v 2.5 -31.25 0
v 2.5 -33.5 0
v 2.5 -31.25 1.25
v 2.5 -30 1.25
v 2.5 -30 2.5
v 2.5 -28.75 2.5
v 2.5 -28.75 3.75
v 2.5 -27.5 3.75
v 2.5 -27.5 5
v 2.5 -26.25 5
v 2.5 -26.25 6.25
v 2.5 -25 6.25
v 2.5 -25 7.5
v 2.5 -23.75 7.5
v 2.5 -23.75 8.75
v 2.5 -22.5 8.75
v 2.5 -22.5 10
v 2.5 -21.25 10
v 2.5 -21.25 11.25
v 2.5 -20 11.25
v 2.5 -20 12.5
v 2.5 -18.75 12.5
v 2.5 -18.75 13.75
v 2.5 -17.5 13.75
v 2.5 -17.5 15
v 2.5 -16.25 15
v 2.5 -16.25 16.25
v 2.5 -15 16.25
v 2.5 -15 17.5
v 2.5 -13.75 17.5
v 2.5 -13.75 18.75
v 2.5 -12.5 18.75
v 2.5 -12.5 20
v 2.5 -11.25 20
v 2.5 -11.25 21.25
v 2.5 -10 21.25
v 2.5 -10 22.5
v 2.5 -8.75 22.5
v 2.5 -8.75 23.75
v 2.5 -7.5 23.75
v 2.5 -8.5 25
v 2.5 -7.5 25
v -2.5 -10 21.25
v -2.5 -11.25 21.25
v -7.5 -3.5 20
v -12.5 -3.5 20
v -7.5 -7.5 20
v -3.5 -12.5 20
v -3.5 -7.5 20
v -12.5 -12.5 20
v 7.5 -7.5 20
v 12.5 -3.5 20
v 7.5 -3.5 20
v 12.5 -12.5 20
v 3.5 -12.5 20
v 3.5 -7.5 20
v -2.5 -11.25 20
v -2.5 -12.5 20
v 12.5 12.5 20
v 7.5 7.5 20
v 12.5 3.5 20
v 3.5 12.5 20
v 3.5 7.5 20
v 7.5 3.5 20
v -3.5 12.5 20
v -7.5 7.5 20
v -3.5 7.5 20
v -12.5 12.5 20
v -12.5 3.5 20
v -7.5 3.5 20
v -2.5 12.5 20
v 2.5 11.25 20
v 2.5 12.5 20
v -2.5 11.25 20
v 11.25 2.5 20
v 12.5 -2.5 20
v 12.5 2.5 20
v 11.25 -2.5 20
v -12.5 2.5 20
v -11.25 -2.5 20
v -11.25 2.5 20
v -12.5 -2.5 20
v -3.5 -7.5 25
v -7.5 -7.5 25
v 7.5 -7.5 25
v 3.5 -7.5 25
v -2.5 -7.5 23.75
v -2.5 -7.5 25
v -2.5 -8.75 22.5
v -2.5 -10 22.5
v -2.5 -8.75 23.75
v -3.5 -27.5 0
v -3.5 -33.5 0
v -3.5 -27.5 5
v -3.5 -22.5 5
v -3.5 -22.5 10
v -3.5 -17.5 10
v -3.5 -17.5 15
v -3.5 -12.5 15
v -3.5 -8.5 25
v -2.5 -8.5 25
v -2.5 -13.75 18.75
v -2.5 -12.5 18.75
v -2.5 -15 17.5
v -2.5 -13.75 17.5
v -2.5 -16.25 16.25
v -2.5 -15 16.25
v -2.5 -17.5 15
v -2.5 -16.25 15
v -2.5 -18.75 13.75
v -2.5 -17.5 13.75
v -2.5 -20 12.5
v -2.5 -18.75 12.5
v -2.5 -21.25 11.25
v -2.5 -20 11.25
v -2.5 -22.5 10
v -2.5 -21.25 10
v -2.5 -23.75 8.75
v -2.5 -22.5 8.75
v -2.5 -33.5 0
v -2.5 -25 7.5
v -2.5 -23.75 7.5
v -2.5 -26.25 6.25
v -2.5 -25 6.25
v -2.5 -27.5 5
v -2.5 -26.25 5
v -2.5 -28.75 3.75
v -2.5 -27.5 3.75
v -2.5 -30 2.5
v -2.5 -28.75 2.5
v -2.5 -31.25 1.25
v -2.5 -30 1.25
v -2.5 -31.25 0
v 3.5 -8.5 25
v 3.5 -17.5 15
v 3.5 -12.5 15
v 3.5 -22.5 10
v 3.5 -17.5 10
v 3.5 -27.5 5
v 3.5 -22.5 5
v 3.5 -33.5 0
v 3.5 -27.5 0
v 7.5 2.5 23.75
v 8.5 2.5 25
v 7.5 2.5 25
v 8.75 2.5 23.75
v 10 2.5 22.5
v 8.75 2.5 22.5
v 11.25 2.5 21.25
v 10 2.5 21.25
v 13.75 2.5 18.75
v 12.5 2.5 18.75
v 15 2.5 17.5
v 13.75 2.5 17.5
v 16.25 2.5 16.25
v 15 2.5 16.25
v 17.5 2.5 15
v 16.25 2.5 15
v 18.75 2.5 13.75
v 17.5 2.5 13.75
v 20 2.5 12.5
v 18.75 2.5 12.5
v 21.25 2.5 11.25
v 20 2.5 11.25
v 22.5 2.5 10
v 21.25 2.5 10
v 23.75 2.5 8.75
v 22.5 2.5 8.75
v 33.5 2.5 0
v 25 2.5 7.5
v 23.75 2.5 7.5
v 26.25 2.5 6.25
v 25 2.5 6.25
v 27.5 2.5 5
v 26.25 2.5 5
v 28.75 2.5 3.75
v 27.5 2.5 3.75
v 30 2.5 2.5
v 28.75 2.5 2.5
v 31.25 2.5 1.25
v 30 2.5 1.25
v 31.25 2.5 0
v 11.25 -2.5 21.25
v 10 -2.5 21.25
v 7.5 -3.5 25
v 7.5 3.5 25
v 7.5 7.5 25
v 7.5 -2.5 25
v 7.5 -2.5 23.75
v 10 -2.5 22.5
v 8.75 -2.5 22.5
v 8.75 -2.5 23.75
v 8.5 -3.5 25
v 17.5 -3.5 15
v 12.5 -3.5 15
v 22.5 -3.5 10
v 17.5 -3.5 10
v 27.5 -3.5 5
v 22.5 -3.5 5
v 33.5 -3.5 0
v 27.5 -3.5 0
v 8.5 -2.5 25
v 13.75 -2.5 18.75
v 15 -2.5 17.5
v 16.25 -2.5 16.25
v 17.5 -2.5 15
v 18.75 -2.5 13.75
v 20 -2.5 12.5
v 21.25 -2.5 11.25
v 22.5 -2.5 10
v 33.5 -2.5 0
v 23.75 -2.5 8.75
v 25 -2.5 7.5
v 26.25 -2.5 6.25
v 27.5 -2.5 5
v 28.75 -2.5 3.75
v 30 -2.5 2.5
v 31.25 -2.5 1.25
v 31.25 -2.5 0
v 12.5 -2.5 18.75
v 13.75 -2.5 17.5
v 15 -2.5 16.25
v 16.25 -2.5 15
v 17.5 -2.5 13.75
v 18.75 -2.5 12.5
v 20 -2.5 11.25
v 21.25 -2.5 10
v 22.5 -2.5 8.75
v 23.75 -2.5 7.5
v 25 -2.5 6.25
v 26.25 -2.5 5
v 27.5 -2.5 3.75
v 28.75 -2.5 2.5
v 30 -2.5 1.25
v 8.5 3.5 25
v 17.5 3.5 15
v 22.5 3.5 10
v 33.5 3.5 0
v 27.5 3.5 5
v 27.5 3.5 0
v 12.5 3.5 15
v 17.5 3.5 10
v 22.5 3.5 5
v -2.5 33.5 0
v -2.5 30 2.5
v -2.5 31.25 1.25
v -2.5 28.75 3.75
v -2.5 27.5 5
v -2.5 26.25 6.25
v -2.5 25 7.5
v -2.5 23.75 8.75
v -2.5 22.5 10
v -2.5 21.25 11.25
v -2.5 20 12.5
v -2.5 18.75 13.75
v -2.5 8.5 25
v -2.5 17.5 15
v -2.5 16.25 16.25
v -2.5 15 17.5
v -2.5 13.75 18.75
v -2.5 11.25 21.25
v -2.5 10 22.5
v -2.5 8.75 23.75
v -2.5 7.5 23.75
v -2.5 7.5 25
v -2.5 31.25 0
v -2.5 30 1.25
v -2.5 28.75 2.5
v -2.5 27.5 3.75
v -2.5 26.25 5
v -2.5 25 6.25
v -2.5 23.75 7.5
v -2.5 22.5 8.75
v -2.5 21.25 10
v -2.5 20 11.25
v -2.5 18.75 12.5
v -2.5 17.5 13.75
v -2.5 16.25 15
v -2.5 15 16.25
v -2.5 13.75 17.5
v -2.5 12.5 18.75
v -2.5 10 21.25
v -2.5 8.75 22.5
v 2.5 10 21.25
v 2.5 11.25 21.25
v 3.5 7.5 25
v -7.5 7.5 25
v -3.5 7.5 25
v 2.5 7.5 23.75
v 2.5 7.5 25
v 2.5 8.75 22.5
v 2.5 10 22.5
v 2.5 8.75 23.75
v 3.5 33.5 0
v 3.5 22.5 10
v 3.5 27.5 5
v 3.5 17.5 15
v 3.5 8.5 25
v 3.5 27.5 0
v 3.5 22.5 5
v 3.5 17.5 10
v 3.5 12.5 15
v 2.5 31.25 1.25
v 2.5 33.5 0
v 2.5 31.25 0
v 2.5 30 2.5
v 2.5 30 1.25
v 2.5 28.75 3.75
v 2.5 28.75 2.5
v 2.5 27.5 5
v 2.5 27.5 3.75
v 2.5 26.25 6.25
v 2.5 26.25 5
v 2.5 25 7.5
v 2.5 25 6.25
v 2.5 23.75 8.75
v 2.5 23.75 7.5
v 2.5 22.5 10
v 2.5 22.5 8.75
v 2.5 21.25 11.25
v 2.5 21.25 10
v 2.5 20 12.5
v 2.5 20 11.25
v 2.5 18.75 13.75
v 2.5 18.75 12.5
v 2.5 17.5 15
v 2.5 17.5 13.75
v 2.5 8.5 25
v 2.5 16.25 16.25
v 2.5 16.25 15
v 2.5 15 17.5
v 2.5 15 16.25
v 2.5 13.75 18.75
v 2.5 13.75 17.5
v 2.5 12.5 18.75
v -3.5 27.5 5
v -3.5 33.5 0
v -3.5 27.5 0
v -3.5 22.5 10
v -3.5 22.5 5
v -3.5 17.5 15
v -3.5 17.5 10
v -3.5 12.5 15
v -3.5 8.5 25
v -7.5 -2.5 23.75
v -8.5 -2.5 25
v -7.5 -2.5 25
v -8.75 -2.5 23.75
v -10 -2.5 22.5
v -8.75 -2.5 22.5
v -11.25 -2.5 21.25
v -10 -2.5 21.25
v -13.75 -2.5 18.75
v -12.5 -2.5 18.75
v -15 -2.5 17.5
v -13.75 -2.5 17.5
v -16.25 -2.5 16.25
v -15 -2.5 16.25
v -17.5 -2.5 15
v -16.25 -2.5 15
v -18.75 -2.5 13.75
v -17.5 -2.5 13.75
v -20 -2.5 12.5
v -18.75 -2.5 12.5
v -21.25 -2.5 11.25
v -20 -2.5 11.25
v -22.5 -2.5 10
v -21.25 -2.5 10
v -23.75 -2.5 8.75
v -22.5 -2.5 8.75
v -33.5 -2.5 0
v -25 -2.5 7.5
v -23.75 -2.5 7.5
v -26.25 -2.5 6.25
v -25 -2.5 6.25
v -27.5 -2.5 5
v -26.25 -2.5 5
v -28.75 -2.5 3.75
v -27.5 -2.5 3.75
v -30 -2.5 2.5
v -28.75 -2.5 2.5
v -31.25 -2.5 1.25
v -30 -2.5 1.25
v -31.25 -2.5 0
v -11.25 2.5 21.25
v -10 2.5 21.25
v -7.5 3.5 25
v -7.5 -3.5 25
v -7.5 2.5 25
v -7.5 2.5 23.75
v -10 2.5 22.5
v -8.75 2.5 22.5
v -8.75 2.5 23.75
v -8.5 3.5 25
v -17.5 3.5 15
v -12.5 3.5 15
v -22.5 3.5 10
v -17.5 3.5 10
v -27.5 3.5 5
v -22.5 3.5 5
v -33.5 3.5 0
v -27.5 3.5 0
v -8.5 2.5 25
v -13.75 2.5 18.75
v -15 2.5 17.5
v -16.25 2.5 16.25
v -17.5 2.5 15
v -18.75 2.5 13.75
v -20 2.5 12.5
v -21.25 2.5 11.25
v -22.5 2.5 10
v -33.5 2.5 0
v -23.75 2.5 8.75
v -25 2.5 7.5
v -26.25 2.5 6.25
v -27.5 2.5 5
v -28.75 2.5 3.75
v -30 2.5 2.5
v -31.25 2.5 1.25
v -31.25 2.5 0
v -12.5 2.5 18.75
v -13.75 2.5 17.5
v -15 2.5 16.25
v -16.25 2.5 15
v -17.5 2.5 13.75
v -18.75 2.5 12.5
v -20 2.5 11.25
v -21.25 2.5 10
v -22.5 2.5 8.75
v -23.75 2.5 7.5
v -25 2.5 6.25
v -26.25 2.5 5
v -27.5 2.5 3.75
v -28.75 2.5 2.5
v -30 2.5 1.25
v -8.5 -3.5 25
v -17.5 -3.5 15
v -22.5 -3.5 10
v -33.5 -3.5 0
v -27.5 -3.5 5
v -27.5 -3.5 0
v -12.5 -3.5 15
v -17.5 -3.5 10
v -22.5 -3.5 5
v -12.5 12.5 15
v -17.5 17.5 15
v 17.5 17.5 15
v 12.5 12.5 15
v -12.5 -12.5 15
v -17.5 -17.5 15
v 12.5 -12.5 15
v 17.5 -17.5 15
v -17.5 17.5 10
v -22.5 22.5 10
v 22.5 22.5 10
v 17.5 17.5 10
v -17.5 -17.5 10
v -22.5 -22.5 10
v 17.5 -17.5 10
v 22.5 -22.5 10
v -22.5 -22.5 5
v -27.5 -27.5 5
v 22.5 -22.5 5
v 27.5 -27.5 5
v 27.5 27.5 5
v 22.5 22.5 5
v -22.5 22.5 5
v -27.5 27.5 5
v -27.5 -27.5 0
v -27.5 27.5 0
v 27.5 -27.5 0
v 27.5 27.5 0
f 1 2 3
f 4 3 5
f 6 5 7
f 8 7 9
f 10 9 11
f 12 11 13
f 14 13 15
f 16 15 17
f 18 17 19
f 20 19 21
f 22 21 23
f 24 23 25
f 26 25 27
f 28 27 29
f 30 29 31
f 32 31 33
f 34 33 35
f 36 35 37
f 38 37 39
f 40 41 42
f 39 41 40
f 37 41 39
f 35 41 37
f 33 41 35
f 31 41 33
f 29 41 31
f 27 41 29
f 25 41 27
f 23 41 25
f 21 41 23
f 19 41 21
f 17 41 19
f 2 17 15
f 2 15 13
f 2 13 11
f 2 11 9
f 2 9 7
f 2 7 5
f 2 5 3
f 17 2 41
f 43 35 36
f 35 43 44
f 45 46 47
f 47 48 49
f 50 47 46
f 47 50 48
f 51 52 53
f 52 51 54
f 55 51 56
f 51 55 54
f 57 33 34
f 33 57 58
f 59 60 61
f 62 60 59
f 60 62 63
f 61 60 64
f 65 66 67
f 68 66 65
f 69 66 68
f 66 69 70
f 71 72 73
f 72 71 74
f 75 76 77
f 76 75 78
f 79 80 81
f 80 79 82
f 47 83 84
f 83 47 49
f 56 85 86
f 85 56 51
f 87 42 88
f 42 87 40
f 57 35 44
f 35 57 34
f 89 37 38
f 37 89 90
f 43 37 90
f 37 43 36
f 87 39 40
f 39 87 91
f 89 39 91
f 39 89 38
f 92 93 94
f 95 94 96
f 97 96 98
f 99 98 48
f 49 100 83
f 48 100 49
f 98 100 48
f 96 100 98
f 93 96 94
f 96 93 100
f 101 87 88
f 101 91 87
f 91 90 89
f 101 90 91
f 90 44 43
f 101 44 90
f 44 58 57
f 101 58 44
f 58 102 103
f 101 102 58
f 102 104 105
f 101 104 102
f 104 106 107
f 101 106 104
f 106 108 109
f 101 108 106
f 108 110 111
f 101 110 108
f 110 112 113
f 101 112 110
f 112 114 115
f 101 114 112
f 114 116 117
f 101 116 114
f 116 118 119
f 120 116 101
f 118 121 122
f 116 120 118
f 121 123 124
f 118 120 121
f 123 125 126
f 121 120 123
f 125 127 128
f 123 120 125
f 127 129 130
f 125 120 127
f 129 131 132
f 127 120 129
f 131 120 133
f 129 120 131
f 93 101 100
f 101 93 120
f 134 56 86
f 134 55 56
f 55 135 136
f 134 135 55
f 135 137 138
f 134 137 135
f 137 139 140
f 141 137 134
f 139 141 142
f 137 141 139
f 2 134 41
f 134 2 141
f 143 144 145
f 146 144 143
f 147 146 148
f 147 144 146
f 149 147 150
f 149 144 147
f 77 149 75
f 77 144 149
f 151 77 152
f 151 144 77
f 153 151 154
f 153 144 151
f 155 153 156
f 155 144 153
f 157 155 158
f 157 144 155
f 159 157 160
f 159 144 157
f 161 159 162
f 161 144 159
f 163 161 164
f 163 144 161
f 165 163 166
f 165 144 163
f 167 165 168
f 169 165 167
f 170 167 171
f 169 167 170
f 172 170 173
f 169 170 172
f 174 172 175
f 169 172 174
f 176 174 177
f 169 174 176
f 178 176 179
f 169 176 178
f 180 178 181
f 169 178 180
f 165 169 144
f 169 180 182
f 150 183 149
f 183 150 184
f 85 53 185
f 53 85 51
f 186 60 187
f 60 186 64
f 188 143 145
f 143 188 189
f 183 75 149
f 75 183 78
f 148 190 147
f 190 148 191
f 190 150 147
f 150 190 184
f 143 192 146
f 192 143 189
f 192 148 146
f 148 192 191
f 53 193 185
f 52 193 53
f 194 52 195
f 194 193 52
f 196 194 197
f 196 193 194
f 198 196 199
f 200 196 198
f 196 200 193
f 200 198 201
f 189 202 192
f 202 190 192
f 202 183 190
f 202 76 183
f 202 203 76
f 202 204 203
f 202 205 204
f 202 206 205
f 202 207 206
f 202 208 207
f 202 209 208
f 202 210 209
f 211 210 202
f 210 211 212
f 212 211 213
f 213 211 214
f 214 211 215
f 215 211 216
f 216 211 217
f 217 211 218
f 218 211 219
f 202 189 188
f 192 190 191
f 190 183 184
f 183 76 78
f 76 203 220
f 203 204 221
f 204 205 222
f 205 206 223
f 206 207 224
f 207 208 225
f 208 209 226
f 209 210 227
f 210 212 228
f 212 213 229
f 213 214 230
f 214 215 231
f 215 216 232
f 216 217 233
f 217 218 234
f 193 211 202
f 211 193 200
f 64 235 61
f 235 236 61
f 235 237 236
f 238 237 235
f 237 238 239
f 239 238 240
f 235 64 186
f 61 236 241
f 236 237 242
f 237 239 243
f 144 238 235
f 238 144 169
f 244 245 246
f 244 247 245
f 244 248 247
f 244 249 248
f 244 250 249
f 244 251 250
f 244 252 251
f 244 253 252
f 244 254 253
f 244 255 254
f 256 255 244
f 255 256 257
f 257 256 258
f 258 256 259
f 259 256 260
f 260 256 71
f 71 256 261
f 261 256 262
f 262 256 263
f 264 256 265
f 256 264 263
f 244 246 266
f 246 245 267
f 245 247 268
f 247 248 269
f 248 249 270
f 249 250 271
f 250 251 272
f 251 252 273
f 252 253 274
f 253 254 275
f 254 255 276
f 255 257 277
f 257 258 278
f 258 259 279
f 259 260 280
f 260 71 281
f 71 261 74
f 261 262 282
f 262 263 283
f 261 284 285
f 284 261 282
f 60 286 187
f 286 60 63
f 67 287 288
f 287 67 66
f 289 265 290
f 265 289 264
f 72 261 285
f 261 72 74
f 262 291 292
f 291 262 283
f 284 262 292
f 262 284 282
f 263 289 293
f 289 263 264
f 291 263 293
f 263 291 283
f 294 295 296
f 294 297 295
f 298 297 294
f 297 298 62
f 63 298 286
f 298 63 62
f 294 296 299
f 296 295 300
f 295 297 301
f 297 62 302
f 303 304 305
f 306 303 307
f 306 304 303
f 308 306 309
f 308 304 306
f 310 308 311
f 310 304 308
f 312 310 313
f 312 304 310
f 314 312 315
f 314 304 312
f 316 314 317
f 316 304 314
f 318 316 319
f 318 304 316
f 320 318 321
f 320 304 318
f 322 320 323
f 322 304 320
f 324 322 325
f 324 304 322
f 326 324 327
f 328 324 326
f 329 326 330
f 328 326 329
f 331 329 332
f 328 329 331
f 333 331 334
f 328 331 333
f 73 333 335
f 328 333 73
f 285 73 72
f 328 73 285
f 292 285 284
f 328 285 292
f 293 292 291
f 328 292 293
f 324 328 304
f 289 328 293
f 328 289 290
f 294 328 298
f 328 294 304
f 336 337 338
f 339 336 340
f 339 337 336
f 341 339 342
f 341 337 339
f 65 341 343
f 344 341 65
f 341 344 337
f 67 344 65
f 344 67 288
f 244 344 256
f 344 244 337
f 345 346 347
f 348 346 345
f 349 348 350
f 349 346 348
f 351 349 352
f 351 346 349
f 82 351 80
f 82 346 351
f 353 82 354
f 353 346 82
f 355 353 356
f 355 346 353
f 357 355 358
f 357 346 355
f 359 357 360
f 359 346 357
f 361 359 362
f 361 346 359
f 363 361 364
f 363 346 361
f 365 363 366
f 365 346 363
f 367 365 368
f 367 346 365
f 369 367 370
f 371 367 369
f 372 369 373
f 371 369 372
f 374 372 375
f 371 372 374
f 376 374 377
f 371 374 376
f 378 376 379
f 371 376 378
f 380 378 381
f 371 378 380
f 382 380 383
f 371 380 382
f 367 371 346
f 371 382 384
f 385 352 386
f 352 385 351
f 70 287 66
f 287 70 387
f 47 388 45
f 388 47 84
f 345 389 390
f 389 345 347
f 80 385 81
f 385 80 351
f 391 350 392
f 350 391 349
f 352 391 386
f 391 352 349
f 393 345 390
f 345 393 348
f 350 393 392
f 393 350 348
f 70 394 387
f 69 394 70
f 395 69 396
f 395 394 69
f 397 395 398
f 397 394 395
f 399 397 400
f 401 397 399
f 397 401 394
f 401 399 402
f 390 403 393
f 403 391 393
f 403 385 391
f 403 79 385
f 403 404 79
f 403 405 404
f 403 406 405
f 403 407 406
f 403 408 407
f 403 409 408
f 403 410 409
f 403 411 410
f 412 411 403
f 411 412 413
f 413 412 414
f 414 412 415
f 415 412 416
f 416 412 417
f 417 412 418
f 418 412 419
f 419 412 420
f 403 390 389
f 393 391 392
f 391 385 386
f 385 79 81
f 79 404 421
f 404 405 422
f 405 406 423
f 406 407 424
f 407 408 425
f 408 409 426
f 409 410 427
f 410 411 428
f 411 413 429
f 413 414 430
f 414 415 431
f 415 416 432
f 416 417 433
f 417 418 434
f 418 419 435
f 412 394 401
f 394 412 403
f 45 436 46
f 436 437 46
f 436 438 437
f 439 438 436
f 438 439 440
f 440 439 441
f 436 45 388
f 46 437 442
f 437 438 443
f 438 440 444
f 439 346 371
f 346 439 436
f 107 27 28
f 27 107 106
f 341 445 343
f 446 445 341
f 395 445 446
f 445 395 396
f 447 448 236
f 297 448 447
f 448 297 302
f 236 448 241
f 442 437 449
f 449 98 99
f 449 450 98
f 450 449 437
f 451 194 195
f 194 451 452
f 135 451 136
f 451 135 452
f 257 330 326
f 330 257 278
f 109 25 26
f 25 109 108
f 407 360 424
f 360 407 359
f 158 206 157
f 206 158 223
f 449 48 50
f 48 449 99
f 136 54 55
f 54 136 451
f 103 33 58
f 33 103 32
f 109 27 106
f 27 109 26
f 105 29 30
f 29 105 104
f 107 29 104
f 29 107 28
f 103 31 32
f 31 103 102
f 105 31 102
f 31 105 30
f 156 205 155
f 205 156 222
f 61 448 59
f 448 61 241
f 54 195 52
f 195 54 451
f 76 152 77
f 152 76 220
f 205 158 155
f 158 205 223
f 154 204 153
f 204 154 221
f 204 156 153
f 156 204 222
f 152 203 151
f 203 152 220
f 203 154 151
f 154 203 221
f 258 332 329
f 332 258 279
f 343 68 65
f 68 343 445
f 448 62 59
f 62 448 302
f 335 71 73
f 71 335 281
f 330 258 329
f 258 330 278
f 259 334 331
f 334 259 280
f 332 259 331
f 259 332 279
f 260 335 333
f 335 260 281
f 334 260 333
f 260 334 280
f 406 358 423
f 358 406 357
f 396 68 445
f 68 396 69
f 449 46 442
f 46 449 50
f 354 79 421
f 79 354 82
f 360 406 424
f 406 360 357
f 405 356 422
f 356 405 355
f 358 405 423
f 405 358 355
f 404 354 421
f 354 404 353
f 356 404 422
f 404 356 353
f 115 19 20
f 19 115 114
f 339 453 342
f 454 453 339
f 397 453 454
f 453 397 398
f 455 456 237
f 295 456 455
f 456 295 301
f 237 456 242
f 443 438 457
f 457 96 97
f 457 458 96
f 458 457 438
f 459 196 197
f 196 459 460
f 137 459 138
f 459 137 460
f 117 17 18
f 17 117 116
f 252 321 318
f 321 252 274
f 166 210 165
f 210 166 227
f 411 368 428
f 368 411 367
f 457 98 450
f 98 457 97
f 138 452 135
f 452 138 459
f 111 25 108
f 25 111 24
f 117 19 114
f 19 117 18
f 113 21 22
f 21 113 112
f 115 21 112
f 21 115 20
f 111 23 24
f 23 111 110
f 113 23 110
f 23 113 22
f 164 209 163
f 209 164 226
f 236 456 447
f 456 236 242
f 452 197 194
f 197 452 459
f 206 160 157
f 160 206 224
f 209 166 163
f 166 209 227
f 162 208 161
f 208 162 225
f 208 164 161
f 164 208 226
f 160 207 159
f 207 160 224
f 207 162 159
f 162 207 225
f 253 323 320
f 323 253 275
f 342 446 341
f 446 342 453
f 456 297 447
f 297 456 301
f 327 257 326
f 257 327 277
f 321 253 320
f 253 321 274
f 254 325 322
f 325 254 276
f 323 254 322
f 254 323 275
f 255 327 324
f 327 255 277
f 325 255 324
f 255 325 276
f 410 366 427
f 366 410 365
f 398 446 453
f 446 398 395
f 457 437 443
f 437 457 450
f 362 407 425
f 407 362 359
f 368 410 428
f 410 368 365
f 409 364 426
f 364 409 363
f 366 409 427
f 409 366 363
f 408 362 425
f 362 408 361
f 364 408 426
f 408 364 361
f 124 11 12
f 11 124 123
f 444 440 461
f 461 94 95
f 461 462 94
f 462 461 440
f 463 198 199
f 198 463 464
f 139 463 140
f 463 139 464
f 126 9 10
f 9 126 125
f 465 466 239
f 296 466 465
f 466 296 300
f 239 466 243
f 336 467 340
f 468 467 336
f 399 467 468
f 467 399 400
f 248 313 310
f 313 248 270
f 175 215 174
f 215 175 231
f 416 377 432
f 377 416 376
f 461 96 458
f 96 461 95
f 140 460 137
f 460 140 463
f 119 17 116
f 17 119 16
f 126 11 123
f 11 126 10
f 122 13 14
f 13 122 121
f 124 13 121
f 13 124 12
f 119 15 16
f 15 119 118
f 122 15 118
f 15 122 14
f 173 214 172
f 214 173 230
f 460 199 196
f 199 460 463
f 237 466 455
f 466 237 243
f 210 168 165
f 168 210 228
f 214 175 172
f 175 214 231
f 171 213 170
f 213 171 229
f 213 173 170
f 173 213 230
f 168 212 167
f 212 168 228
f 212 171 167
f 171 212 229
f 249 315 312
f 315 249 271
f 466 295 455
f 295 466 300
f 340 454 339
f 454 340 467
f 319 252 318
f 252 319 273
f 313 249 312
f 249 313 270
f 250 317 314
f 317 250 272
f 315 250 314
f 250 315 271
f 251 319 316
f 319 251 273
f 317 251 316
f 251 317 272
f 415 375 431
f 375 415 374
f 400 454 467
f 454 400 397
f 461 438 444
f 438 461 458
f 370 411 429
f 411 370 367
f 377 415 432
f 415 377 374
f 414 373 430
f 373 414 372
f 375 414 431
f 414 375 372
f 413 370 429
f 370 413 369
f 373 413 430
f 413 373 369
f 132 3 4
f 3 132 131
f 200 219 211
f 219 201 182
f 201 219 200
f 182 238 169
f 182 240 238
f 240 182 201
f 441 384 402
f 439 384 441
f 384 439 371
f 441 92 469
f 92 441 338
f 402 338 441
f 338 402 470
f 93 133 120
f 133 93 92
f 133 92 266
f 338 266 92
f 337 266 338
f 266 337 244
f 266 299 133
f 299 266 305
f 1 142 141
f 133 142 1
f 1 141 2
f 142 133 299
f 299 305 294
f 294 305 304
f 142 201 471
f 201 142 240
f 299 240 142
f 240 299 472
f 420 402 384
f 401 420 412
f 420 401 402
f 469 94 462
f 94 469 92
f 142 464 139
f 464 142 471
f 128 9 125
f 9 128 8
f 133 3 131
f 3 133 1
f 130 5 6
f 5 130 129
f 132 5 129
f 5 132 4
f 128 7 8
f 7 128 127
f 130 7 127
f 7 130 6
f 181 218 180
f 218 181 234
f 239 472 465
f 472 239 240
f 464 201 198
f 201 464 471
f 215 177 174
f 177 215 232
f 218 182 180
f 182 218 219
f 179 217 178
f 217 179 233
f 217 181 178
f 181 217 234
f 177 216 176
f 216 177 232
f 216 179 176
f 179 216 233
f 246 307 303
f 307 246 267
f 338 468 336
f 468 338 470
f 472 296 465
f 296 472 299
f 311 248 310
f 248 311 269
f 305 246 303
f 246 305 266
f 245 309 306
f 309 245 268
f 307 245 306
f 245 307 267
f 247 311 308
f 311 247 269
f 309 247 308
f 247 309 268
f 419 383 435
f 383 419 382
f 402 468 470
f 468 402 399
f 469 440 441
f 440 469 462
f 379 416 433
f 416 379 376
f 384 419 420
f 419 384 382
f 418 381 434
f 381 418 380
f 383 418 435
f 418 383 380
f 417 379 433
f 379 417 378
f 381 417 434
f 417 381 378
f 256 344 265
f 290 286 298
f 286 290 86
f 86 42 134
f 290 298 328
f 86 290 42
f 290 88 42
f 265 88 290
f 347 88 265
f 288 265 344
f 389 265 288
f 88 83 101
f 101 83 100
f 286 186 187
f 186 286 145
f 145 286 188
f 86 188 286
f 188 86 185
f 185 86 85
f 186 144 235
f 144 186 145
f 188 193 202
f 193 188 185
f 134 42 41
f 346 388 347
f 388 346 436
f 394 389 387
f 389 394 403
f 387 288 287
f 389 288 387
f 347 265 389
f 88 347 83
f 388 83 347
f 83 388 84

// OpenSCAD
// ****************************************************
//              INCA Pyramid
// By:          Humberto Kelkboom 
// Date:        17 Oct 2014
//
//*****************************************************


//Set the scaling of the Object. Standard it base is 1x1x1
ScaleFactor = 5;

//Set the number of levels of the Pyramid
Nivo = 5 ;


scale([ScaleFactor,ScaleFactor,ScaleFactor])
difference()
{
union() 
{
    for ( i = [1 : Nivo] )
    {
        translate([(i*-1)-0.5,(i*-1)-0.5,Nivo-i]) cube([1+(i*2),1+(i*2),1]);
        
        for(rot=[0:3])
        {
            rotate([0,0,rot*90]) 
            {
                for(tr=[1:4])
                {
                    translate([-0.5,-0.5-i-(1-(0.25*tr)),Nivo-i]) cube([1,(1-(0.25*tr)),0.25*tr]);
                }           

                translate([-0.7,-0.5-i,Nivo-i])
                rotate([180,-90,0]) linear_extrude(height=0.2) polygon([[0,0],[0,1.2],[1.2,0]]);
                
                translate([0.5,-0.5-i,Nivo-i])
                rotate([180,-90,0]) linear_extrude(height=0.2) polygon([[0,0],[0,1.2],[1.2,0]]);
            }
        }       
    }

}
translate([(1*-1)-0.75,(1*-1)-0.75,Nivo]) cube([1.5+(1*2),1.5+(1*2),0.3]);

};
